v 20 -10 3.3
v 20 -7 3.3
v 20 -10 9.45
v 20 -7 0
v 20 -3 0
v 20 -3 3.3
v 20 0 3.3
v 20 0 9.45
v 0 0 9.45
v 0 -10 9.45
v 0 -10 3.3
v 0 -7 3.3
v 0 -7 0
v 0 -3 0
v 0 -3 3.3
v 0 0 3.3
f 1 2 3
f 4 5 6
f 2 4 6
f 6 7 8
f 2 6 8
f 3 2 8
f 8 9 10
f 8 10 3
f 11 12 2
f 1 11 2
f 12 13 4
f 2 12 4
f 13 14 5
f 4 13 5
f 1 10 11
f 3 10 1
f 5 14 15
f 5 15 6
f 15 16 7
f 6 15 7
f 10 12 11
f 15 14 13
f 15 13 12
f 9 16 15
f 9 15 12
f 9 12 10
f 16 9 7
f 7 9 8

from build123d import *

# Parameters (mm, degrees)
F0_W     = 20
F0_H     = 9.45
F1_DEPTH = 10
F2_W     = 20
F2_H     = 3
F3_DEPTH = 3.3


with BuildPart() as f1:
    # F0 (on Front) → F1 (new body)
    with BuildSketch(Plane.XZ):
        with Locations((10, 4.725)):
            Rectangle(F0_W, F0_H)
    extrude(amount=F1_DEPTH)

    # F2 (on Top) → F3 (cut)
    with BuildSketch(Plane.XY):
        with Locations((10, -8.5)):
            Rectangle(F2_W, F2_H)
        with Locations((10, -1.5)):
            Rectangle(F2_W, F2_H)
    extrude(amount=F3_DEPTH, mode=Mode.SUBTRACT)


solid = f1.part
